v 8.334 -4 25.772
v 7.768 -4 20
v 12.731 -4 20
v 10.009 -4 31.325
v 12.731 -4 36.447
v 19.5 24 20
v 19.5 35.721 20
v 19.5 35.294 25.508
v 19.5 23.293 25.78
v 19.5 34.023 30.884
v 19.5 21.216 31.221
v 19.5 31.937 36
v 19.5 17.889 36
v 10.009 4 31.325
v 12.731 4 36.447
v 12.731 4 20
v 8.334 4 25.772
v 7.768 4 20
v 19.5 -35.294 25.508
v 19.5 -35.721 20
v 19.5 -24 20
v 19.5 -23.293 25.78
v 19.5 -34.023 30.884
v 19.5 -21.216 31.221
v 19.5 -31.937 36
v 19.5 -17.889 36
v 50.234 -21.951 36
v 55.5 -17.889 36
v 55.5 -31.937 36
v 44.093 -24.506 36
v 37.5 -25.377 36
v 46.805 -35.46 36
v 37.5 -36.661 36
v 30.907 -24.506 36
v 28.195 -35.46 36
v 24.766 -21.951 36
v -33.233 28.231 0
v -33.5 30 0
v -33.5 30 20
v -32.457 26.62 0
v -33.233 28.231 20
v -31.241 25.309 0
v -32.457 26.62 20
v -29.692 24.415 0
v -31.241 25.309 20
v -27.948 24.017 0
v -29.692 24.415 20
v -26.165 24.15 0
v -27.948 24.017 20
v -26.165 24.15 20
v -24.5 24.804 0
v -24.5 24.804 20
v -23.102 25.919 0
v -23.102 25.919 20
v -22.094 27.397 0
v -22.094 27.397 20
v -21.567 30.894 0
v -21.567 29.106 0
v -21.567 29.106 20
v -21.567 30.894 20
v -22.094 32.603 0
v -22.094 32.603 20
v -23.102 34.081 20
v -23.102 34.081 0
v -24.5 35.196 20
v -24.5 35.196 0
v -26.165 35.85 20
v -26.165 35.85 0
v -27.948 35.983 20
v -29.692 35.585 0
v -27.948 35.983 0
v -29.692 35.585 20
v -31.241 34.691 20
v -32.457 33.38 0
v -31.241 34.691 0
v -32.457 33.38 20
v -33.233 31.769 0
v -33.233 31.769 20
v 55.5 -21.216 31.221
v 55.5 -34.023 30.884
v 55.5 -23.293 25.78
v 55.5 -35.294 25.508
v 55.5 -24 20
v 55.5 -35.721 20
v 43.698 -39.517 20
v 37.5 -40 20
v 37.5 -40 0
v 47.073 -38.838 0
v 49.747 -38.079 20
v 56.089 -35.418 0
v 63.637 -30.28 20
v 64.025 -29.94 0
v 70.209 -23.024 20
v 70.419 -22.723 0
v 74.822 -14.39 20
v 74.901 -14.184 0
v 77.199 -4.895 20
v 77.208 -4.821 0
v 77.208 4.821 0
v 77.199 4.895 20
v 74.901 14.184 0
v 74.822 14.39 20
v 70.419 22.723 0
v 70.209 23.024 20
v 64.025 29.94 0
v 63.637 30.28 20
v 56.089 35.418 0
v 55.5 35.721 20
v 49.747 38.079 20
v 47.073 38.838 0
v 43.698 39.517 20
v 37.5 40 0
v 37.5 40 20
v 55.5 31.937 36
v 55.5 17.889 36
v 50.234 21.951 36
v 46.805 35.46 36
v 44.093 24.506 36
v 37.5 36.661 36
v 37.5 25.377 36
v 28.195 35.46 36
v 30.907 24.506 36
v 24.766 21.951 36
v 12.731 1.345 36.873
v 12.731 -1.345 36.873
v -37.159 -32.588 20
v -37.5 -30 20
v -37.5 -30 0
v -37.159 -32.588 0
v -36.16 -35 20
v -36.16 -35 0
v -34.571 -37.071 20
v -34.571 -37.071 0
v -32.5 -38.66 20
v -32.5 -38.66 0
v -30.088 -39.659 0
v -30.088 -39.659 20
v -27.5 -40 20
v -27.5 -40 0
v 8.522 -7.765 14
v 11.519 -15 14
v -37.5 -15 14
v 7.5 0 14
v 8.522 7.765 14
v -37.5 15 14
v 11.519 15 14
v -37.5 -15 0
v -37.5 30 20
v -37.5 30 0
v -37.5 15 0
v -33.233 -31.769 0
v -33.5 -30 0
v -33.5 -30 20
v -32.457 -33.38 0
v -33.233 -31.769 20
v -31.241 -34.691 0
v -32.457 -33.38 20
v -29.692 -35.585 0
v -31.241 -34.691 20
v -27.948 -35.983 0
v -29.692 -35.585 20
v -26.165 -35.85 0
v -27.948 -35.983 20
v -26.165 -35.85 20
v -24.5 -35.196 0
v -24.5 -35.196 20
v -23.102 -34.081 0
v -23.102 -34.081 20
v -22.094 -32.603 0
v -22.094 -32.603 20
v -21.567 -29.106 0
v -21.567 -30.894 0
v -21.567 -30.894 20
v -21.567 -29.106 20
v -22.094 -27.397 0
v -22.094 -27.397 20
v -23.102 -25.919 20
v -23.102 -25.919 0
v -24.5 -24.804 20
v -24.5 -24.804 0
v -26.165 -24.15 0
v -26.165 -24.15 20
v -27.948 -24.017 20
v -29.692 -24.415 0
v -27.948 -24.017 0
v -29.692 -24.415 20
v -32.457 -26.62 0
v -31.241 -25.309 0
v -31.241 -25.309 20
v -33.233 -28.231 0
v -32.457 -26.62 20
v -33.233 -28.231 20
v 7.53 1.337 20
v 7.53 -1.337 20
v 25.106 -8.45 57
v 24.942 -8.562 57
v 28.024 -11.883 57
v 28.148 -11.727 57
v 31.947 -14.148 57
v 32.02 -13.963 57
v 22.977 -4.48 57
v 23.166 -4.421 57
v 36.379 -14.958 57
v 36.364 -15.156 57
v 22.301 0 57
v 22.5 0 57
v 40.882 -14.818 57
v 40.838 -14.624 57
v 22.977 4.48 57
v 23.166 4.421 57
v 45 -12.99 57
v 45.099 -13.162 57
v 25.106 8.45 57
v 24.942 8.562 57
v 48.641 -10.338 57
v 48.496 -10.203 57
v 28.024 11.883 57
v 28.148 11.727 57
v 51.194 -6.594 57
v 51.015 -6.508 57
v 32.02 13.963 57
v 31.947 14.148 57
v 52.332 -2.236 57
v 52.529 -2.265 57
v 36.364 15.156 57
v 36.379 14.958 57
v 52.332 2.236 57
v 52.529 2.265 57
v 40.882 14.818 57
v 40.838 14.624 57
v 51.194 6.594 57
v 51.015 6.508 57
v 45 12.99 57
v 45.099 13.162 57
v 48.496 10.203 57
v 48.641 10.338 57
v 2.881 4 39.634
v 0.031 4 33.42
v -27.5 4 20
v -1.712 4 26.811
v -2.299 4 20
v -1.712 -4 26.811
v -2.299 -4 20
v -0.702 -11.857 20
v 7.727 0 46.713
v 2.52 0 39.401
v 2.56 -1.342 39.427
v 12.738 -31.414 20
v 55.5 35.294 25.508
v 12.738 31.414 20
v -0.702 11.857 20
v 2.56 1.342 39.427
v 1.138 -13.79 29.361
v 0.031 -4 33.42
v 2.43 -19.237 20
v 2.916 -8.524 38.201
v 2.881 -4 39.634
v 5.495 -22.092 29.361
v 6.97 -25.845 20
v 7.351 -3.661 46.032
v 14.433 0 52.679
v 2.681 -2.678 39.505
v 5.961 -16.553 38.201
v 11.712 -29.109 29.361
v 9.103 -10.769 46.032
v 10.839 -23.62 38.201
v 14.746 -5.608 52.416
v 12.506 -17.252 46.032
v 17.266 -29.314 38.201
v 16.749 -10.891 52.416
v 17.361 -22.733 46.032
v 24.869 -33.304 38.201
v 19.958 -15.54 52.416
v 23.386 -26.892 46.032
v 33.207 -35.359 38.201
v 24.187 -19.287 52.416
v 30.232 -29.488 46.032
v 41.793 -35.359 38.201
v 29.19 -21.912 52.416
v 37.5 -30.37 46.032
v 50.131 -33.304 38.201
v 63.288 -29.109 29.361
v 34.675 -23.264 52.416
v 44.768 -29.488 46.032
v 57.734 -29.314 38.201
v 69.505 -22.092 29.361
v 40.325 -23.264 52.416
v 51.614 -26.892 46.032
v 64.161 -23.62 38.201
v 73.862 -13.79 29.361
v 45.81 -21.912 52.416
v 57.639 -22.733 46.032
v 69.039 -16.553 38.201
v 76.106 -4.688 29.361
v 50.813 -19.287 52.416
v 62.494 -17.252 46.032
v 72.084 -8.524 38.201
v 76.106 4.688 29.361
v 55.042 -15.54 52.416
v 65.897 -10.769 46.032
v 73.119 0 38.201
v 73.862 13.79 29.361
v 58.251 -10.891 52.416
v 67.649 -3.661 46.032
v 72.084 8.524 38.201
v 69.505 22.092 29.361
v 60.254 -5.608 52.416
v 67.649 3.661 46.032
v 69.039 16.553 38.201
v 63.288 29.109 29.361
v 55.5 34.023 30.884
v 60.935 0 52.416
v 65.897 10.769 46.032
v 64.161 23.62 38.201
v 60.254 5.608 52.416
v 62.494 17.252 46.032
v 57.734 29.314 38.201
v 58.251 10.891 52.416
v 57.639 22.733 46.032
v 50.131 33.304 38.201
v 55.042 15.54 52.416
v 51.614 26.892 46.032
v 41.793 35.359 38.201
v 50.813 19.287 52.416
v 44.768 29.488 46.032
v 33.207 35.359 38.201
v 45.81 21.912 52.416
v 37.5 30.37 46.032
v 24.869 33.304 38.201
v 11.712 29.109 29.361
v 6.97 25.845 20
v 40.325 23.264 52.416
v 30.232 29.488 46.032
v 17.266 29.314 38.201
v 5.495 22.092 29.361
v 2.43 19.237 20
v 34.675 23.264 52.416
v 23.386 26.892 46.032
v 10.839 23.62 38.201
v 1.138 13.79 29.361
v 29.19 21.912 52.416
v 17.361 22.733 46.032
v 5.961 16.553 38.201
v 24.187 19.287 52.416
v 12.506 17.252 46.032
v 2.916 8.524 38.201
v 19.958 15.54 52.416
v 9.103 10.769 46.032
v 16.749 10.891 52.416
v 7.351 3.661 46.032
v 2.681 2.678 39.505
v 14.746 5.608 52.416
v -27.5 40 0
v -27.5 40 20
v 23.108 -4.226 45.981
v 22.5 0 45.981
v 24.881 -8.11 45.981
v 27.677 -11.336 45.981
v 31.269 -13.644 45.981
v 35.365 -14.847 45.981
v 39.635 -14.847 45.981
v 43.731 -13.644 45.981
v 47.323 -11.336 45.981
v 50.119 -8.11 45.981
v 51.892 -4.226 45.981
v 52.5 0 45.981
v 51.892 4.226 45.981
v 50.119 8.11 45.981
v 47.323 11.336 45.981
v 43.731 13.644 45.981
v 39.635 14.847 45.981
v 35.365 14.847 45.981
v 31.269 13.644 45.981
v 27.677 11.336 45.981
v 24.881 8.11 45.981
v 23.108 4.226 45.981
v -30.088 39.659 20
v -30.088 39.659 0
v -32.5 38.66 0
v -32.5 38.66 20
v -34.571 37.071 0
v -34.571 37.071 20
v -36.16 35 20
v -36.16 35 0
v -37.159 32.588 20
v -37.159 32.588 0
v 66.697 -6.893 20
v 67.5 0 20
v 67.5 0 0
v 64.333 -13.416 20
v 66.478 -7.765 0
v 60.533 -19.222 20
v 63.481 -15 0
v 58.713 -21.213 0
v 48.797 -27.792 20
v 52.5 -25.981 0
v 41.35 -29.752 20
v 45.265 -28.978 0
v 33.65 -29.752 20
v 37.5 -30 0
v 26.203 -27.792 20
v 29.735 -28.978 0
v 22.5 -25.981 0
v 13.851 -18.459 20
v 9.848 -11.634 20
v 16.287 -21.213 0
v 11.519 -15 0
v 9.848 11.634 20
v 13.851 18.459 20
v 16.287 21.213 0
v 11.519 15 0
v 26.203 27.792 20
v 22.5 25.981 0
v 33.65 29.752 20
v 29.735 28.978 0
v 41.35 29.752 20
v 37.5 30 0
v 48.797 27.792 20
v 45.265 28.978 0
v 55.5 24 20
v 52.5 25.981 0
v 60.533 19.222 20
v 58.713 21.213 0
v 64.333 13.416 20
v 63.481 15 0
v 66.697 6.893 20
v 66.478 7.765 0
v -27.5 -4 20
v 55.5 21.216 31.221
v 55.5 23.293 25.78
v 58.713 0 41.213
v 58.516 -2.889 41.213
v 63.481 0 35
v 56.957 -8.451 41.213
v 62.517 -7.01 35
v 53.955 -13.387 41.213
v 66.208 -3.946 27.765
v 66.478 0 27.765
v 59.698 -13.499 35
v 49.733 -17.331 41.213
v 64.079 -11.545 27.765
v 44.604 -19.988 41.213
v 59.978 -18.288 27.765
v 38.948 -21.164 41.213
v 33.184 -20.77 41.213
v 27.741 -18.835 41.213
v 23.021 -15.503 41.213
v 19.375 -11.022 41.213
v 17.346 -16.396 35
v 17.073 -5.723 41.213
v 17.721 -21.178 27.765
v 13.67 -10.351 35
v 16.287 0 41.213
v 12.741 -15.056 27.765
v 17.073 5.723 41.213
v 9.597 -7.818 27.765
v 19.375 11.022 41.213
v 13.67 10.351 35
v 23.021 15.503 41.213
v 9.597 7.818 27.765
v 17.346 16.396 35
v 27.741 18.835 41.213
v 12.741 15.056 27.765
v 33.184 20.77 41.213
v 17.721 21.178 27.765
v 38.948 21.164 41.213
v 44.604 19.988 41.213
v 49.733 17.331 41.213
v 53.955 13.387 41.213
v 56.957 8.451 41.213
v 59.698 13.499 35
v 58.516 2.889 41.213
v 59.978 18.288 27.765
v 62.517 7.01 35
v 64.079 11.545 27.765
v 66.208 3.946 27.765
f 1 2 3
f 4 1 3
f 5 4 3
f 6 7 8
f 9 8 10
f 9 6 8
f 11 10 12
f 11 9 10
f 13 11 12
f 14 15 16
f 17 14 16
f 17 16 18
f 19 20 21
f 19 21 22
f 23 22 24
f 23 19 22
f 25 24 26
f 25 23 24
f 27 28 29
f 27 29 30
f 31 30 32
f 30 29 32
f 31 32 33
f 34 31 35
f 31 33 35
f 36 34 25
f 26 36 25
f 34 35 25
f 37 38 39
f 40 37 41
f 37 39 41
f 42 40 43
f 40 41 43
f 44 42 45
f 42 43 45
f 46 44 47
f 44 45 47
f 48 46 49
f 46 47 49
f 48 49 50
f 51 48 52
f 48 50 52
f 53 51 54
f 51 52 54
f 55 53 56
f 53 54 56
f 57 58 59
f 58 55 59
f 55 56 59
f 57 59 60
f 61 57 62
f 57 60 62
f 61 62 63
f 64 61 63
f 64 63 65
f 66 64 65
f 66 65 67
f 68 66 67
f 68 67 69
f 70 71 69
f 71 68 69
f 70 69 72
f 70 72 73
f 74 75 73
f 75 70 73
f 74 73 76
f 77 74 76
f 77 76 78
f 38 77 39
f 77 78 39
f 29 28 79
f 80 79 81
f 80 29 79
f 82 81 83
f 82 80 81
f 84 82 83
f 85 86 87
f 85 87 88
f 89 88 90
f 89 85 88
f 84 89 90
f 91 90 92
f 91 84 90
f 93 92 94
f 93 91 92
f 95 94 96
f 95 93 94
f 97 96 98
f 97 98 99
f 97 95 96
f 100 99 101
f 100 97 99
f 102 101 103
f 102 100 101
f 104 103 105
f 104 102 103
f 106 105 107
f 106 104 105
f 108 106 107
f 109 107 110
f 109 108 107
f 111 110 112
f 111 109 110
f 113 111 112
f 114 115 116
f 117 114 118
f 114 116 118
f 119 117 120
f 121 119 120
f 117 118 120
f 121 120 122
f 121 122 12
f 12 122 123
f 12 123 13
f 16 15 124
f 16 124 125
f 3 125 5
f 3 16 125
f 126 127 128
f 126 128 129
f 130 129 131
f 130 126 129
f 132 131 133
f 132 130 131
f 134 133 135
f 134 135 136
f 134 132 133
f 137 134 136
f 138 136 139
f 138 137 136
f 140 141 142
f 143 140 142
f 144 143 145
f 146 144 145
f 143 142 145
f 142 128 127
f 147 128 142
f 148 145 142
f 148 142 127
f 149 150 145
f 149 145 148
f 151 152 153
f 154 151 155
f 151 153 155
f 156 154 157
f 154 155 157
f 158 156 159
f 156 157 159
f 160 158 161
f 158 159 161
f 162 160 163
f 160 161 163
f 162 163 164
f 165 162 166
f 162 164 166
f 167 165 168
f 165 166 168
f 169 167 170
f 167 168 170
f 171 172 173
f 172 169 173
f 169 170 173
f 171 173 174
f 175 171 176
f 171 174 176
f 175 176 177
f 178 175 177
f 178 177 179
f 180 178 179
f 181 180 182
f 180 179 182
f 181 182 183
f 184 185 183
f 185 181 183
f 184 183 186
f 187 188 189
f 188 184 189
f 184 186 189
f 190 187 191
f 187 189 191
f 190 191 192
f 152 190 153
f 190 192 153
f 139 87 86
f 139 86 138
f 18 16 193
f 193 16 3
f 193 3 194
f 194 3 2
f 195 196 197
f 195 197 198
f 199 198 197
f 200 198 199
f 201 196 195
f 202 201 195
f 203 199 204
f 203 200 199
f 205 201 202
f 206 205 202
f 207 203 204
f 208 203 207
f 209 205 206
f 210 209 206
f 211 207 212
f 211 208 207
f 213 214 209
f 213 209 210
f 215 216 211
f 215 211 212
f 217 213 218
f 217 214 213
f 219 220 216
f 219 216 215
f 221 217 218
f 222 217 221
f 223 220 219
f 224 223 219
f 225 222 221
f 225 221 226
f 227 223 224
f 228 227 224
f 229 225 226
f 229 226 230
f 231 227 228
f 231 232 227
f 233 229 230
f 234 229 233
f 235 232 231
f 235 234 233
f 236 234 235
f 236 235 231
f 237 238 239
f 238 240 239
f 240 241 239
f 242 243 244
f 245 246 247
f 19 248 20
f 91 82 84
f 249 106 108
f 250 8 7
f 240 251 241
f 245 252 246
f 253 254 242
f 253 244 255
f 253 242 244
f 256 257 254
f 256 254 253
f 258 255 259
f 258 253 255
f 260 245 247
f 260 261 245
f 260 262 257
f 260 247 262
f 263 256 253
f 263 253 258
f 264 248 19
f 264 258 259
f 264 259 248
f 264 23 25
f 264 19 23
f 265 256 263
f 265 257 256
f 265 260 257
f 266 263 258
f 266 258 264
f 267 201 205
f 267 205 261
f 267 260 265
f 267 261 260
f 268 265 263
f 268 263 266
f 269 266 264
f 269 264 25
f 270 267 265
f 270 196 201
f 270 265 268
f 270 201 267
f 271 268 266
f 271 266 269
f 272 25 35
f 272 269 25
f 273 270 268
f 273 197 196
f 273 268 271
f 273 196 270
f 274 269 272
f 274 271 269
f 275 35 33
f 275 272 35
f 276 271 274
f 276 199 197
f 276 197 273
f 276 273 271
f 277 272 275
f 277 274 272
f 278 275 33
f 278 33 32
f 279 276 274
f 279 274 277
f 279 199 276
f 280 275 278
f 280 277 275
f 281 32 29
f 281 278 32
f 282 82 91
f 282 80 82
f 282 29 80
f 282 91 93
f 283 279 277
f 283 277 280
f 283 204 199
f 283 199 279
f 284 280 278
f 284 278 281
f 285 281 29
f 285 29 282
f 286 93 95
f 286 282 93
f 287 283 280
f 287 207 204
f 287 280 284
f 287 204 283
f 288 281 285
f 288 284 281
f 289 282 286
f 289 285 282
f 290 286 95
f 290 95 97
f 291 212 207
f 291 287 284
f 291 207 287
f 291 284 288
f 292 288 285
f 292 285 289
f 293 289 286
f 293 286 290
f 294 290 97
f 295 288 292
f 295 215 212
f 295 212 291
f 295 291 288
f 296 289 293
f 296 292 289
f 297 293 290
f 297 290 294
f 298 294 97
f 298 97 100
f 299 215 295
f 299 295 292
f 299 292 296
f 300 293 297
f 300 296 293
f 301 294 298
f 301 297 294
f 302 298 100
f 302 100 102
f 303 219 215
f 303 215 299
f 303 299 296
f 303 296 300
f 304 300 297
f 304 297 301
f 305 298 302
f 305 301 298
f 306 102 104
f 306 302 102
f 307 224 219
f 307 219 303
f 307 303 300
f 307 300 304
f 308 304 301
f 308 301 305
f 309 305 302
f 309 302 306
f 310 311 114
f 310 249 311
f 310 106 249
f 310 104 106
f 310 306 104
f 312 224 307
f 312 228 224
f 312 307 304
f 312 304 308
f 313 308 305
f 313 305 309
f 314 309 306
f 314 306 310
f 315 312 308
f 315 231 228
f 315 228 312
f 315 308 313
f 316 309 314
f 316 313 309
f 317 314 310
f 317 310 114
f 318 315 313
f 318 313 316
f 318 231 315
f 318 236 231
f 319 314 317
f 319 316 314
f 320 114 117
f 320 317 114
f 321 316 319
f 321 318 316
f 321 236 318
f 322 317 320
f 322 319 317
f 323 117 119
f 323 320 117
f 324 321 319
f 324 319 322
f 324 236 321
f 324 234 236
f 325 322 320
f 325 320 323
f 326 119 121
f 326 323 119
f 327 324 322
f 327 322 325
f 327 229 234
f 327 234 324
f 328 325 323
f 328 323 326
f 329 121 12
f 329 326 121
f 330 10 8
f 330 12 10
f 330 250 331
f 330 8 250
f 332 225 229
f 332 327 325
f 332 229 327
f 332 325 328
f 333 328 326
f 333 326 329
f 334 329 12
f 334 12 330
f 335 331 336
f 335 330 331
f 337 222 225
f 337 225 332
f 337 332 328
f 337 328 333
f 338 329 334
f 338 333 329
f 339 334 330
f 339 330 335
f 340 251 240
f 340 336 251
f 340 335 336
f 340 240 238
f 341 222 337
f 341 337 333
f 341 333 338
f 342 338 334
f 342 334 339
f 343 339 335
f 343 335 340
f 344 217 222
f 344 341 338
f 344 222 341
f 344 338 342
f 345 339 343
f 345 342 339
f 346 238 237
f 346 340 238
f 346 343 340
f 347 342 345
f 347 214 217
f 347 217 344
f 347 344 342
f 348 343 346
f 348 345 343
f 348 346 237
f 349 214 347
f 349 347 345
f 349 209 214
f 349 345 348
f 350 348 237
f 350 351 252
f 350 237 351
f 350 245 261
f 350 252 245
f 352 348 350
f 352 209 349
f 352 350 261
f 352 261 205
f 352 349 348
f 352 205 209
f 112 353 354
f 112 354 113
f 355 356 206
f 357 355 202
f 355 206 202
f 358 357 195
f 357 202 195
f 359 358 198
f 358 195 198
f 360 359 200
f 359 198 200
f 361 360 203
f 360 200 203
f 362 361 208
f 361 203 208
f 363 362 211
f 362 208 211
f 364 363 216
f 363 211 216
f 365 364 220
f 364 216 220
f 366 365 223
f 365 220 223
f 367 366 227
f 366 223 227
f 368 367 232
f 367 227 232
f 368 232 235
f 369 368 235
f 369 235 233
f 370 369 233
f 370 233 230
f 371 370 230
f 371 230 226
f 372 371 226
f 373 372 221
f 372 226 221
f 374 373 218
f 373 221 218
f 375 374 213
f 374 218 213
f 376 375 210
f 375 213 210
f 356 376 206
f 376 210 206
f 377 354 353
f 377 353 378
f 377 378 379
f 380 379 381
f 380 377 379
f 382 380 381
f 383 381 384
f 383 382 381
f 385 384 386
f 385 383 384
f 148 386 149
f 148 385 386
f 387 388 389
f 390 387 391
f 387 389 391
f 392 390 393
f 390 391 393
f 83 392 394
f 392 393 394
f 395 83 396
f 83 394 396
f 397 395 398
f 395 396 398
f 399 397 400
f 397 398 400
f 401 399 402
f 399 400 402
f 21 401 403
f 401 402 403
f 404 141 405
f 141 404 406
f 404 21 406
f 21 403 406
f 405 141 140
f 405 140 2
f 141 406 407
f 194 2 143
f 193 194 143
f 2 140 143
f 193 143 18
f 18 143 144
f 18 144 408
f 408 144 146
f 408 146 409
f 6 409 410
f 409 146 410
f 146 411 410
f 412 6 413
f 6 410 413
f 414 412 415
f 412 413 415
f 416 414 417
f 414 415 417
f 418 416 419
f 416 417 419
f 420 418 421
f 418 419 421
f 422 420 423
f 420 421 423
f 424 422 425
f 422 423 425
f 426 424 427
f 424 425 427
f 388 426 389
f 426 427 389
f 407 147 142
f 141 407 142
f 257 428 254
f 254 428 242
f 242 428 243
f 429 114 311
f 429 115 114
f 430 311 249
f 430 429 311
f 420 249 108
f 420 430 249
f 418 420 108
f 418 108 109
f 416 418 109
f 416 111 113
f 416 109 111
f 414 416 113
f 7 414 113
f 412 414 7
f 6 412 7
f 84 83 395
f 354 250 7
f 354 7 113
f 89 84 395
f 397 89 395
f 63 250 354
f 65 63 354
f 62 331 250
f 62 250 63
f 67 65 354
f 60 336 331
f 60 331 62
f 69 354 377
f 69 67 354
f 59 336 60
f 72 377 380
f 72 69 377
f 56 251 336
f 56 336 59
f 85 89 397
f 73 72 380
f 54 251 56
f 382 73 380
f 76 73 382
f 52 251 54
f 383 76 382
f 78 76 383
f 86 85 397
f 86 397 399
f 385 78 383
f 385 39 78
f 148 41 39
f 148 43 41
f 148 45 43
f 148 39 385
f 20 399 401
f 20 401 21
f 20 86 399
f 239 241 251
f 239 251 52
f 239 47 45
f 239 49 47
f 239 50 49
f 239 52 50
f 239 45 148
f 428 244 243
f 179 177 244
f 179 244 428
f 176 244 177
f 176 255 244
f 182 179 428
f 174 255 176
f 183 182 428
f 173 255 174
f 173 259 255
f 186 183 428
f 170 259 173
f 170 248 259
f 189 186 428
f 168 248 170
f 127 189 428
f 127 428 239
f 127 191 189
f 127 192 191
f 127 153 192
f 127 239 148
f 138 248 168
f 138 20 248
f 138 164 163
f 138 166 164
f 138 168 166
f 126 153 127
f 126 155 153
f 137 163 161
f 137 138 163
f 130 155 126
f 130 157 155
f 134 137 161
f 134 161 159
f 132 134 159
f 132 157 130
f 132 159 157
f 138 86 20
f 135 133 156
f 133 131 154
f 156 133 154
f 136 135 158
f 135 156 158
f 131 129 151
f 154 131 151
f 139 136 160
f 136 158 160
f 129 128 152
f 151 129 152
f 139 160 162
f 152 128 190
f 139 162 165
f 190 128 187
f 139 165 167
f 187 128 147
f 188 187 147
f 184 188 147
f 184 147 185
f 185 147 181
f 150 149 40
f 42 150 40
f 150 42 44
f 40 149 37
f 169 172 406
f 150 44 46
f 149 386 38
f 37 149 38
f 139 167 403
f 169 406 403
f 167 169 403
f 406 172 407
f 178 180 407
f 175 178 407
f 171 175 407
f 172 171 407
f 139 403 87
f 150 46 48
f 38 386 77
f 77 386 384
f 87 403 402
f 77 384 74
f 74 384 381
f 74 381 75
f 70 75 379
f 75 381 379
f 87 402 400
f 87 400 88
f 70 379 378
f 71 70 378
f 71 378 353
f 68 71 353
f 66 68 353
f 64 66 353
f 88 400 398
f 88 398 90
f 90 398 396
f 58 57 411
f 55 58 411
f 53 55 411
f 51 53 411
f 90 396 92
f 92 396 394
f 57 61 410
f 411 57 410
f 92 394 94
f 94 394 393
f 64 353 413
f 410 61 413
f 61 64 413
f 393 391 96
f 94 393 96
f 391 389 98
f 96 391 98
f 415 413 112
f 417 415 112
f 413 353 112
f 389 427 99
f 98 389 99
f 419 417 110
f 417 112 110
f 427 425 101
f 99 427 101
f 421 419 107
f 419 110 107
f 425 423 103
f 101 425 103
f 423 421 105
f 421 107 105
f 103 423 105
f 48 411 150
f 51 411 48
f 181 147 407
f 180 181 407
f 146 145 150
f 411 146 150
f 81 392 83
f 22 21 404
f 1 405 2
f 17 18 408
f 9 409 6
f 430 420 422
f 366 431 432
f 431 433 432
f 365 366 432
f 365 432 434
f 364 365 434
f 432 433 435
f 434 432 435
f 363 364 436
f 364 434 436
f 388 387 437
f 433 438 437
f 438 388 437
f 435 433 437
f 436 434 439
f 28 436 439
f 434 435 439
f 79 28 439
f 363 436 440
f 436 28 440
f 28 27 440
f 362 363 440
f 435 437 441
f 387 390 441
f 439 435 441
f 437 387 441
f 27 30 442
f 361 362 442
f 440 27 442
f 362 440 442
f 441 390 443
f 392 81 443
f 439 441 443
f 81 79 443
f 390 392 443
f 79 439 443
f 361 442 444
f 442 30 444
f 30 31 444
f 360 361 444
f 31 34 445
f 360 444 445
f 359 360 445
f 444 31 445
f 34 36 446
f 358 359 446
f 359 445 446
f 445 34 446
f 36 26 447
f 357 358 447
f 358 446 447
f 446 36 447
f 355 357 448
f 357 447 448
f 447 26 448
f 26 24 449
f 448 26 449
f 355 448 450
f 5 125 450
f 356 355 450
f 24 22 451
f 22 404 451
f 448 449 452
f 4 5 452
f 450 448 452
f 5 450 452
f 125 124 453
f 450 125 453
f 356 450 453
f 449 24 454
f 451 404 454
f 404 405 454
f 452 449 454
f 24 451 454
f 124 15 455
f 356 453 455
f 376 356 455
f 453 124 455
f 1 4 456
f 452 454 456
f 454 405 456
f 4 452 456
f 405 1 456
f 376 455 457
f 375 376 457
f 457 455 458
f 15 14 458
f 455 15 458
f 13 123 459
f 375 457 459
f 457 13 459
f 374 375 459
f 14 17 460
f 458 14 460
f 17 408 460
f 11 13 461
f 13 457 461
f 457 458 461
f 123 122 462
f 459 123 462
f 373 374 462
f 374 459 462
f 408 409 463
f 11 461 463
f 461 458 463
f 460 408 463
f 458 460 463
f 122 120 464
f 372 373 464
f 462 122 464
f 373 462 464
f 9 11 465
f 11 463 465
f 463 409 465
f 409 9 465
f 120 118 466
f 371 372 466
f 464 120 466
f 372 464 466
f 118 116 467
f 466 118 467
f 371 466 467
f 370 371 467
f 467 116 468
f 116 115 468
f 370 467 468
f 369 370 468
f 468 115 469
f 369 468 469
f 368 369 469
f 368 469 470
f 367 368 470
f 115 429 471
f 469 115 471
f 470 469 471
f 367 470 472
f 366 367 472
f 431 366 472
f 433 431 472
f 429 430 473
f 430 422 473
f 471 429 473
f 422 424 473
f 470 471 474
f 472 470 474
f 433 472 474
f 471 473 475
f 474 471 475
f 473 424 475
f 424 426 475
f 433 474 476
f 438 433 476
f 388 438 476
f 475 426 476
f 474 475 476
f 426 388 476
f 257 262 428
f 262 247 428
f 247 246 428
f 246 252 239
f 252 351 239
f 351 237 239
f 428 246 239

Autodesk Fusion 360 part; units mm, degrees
sketch "Sketch1" plane through (0, 0, 0) normal (0, 0, 1) x (1, 0, 0)
  line L0 (0, 0) -> (37.5, 0)
  line L1 (0, 0) -> (-37.5, 0)
  line L2 (-37.5, 0) -> (-37.5, 40)
  line L3 (37.5, 0) -> (37.5, -40)
  line L4 (-37.5, 40) -> (37.5, 40)
  line L5 (37.5, 40) -> (37.5, -40)
  line L6 (37.5, -40) -> (-37.5, -40)
  line L7 (-37.5, -40) -> (-37.5, 40)
  dimension "d1" = 37.5
  dimension "d2" = 37.5
  dimension "d3" = 40
  dimension "d4" = 40
extrude "Extrude1" add sketch "Sketch1" along normal blind 20 makes body 1
sketch "Sketch2" plane through (0, 0, 20) normal (0, 0, 1) x (-1, 0, 0)
  line L0 (37.5, 40) -> (-37.5, 40)
  line L1 (-37.5, 40) -> (-37.5, -40)
  line L2 (-37.5, -40) -> (37.5, -40)
  line L3 (37.5, -40) -> (37.5, 40)
  line L4 (37.5, 0) -> (37.5, -30)
  line L5 (37.5, 0) -> (37.5, 30)
  line L6 (-37.5, -40) -> (27.5, -40)
  circle A0 centre (27.5, -30) radius 6
  circle A1 centre (27.5, 30) radius 6
  point P0 (37.5, 0)
  dimension "d8" = 30
  dimension "d10" = 12
  dimension "d11" = 12
extrude "Extrude2" cut sketch "Sketch2" against normal blind 90 contours A0 | A1 bodies 1
sketch "Sketch3" plane through (0, 0, 20) normal (0, 0, 1) x (-1, 0, 0)
  circle A0 centre (27.5, 30) radius 6
  circle A1 centre (27.5, -30) radius 6
  line L0 (37.5, 40) -> (-37.5, 40)
  line L1 (-37.5, 40) -> (-37.5, -40)
  line L2 (-37.5, -40) -> (37.5, -40)
  line L3 (37.5, -40) -> (37.5, 40)
  circle A2 centre (27.5, 30) radius 10
  circle A3 centre (27.5, -30) radius 10
  dimension "d14" = 20
  dimension "d15" = 20
extrude "Extrude3" cut sketch "Sketch3" against normal blind 35 contours L0 L3 A2 | L2 L3 A3 bodies 1
sketch "Sketch4" plane through (0, 0, 20) normal (0, 0, 1) x (-1, 0, 0)
  arc A0 (37.5, 30) -> (27.5, 40) centre (27.5, 30) ccw
  line L0 (27.5, 40) -> (-37.5, 40)
  line L1 (-37.5, 40) -> (-37.5, -40)
  line L2 (-37.5, -40) -> (27.5, -40)
  arc A1 (27.5, -40) -> (37.5, -30) centre (27.5, -30) ccw
  line L3 (37.5, -30) -> (37.5, 30)
  circle A2 centre (27.5, 30) radius 6
  circle A3 centre (27.5, -30) radius 6
  circle A4 centre (-37.5, 0) radius 40
  dimension "d18" = 80
extrude "Extrude4" add sketch "Sketch4" against normal blind 20 contours L1 A4 | L1 A4 bodies 1
sketch "Sketch5" plane through (0, 0, 0) normal (0, 0, -1) x (1, 0, 0)
  line L0 (37.5, 40) -> (-27.5, 40)
  arc A0 (-27.5, 40) -> (-37.5, 30) centre (-27.5, 30) ccw
  line L1 (-37.5, 30) -> (-37.5, -30)
  arc A1 (-37.5, -30) -> (-27.5, -40) centre (-27.5, -30) ccw
  line L2 (-27.5, -40) -> (37.5, -40)
  arc A2 (37.5, -40) -> (37.5, 40) centre (37.5, 0) ccw
  circle A3 centre (-27.5, 30) radius 6
  circle A4 centre (-27.5, -30) radius 6
  point P0 (37.5, 0)
sphere "SpherePrimitive1" add diameter 80 placed x (-1, 0, 0) y (0, -1, 0) z (0, 0, 1) at (37.5, 0, 20) bodies 1
extrude "Extrude5" cut sketch "Sketch5" along normal blind 20 bodies 1
sketch "Sketch7" plane through (0, 0, 0) normal (0, 0, -1) x (1, 0, 0)
  line L0 (37.5, 40) -> (-27.5, 40)
  arc A0 (-27.5, 40) -> (-37.5, 30) centre (-27.5, 30) ccw
  line L1 (-37.5, 30) -> (-37.5, -30)
  arc A1 (-37.5, -30) -> (-27.5, -40) centre (-27.5, -30) ccw
  line L2 (-27.5, -40) -> (37.5, -40)
  arc A2 (37.5, -40) -> (37.5, 40) centre (37.5, 0) ccw
  circle A3 centre (-27.5, 30) radius 6
  circle A4 centre (-27.5, -30) radius 6
  circle A5 centre (37.5, 0) radius 30
  dimension "d24" = 60
extrude "Extrude6" cut sketch "Sketch7" against normal blind 20 contours A5 bodies 1
sphere "SpherePrimitive2" cut diameter 60 placed x (1, 0, 0) y (0, -1, 0) z (0, 0, -1) at (37.5, 0, 20) bodies 1
sketch "Sketch9" plane through (0, 0, 0) normal (0, 0, 1) x (1, 0, 0)
ref_plane "WorkPlane1" through (0, 0, 57) normal (0, 0, 1) x (1, 0, 0)
sketch "Sketch10" plane through (0, 0, 57) normal (0, 0, 1) x (1, 0, 0)
  line L0 (7.4967, 46.768) -> (98.4073, 46.768)
  line L1 (98.4073, 46.768) -> (98.4073, -40.4525)
  line L2 (98.4073, -40.4525) -> (7.4967, -40.4525)
  line L3 (7.4967, -40.4525) -> (7.4967, 46.768)
extrude "Extrude7" cut sketch "Sketch10" along normal blind 20 bodies 1
sketch "Sketch11" plane through (0, 0, 57) normal (0, 0, 1) x (-1, 0, 0)
  circle A0 centre (-37.5, 0) radius 15.1987
  circle A1 centre (-37.5, 0) radius 15
  dimension "d31" = 30
extrude "Extrude8" cut sketch "Sketch11" against normal blind 15 contours A1 bodies 1
sketch "Sketch12" plane through (0, 0, 20) normal (0, 0, 1) x (-1, 0, 0)
  arc A0 (-37.5, -40) -> (-37.5, 40) centre (-37.5, 0) ccw
  line L0 (-37.5, -40) -> (27.5, -40)
  arc A1 (27.5, -40) -> (37.5, -30) centre (27.5, -30) ccw
  line L1 (37.5, -30) -> (37.5, 30)
  arc A2 (37.5, 30) -> (27.5, 40) centre (27.5, 30) ccw
  line L2 (27.5, 40) -> (-37.5, 40)
  circle A3 centre (27.5, 30) radius 6
  circle A4 centre (27.5, -30) radius 6
  line L3 (-37.5, 40) -> (27.5, 40)
  line L4 (27.5, 0) -> (27.5, -4)
  line L5 (27.5, -4) -> (27.5, 0)
  line L6 (27.5, 0) -> (27.5, 4)
  line L7 (27.5, 4) -> (0, 4)
  line L8 (0, 4) -> (0, -4)
  line L9 (0, -4) -> (27.5, -4)
  line L10 (27.5, -4) -> (0, -4)
  line L11 (0, -4) -> (0, 4)
  line L12 (0, 4) -> (27.5, 4)
  line L13 (27.5, 4) -> (27.5, -4)
  line L14 (27.5, -4) -> (-12.731, -4)
  line L15 (-12.731, -4) -> (-12.731, 4)
  line L16 (-12.731, 4) -> (27.5, 4)
  line L17 (27.5, 4) -> (27.5, -4)
  point P0 (37.5, 0)
  dimension "d34" = 65
  dimension "d37" = 8
extrude "Extrude9" add sketch "Sketch12" along normal blind 26 separate body contours A0 L7 L8 L9 L10 L11 L12 L14 L16 | A0 L4 L5 L6 L7 L9 L10 L12 L13 L14 L16 L17 | L8 L11 L14 L15 L16 makes body 2
sketch "Sketch13" plane through (0, 4, 0) normal (0, 1, 0) x (-1, 0, 0)
  line L0 (-12.731, 20) -> (27.5, 20)
  line L1 (27.5, 20) -> (27.5, 46)
  line L2 (27.5, 46) -> (-12.731, 46)
  line L3 (-12.731, 46) -> (-12.731, 20)
  line L4 (-12.731, 46) -> (27.5, 20)
extrude "Extrude10" cut sketch "Sketch13" against normal blind 24 contours L1 L2 L4 bodies 2
combine "Combine1" operation add target body 2 tool bodies 1
sketch "Sketch14" plane through (-37.5, 0, 0) normal (-1, 0, 0) x (0, -1, 0)
  line L0 (30, 0) -> (30, 20)
  line L1 (30, 20) -> (-30, 20)
  line L2 (-30, 20) -> (-30, 0)
  line L3 (-30, 0) -> (30, 0)
  line L4 (0, 0) -> (-15, 0)
  line L5 (0, 0) -> (15, 0)
  line L6 (-15, 0) -> (15, 0)
  line L7 (15, 0) -> (15, 14)
  line L8 (15, 14) -> (-15, 14)
  line L9 (-15, 14) -> (-15, 0)
  dimension "d42" = 15
  dimension "d44" = 14
extrude "Extrude11" cut sketch "Sketch14" against normal blind 75 contours L3 L4 L5 L6 L7 L8 L9 bodies 2
sketch "Sketch15" plane through (0, -40, 0) normal (0, -1, 0) x (1, 0, 0)
  line L0 (-27.5, 20) -> (-27.5, 0)
  line L1 (-27.5, 0) -> (37.5, 0)
  line L2 (37.5, 20) -> (-27.5, 20)
  line L3 (37.5, 20) -> (37.5, 36)
  line L4 (37.5, 36) -> (55.5, 36)
  line L5 (55.5, 36) -> (37.5, 36)
  line L6 (37.5, 36) -> (19.5, 36)
  line L7 (55.5, 36) -> (55.5, 20)
  line L8 (19.5, 36) -> (55.5, 36)
  line L9 (55.5, 36) -> (55.5, 20)
  line L10 (55.5, 20) -> (19.5, 20)
  line L11 (19.5, 20) -> (19.5, 36)
  dimension "d47" = 16
  dimension "d48" = 18
  dimension "d49" = 18
extrude "Extrude12" cut sketch "Sketch15" against normal blind 105 bodies 2
